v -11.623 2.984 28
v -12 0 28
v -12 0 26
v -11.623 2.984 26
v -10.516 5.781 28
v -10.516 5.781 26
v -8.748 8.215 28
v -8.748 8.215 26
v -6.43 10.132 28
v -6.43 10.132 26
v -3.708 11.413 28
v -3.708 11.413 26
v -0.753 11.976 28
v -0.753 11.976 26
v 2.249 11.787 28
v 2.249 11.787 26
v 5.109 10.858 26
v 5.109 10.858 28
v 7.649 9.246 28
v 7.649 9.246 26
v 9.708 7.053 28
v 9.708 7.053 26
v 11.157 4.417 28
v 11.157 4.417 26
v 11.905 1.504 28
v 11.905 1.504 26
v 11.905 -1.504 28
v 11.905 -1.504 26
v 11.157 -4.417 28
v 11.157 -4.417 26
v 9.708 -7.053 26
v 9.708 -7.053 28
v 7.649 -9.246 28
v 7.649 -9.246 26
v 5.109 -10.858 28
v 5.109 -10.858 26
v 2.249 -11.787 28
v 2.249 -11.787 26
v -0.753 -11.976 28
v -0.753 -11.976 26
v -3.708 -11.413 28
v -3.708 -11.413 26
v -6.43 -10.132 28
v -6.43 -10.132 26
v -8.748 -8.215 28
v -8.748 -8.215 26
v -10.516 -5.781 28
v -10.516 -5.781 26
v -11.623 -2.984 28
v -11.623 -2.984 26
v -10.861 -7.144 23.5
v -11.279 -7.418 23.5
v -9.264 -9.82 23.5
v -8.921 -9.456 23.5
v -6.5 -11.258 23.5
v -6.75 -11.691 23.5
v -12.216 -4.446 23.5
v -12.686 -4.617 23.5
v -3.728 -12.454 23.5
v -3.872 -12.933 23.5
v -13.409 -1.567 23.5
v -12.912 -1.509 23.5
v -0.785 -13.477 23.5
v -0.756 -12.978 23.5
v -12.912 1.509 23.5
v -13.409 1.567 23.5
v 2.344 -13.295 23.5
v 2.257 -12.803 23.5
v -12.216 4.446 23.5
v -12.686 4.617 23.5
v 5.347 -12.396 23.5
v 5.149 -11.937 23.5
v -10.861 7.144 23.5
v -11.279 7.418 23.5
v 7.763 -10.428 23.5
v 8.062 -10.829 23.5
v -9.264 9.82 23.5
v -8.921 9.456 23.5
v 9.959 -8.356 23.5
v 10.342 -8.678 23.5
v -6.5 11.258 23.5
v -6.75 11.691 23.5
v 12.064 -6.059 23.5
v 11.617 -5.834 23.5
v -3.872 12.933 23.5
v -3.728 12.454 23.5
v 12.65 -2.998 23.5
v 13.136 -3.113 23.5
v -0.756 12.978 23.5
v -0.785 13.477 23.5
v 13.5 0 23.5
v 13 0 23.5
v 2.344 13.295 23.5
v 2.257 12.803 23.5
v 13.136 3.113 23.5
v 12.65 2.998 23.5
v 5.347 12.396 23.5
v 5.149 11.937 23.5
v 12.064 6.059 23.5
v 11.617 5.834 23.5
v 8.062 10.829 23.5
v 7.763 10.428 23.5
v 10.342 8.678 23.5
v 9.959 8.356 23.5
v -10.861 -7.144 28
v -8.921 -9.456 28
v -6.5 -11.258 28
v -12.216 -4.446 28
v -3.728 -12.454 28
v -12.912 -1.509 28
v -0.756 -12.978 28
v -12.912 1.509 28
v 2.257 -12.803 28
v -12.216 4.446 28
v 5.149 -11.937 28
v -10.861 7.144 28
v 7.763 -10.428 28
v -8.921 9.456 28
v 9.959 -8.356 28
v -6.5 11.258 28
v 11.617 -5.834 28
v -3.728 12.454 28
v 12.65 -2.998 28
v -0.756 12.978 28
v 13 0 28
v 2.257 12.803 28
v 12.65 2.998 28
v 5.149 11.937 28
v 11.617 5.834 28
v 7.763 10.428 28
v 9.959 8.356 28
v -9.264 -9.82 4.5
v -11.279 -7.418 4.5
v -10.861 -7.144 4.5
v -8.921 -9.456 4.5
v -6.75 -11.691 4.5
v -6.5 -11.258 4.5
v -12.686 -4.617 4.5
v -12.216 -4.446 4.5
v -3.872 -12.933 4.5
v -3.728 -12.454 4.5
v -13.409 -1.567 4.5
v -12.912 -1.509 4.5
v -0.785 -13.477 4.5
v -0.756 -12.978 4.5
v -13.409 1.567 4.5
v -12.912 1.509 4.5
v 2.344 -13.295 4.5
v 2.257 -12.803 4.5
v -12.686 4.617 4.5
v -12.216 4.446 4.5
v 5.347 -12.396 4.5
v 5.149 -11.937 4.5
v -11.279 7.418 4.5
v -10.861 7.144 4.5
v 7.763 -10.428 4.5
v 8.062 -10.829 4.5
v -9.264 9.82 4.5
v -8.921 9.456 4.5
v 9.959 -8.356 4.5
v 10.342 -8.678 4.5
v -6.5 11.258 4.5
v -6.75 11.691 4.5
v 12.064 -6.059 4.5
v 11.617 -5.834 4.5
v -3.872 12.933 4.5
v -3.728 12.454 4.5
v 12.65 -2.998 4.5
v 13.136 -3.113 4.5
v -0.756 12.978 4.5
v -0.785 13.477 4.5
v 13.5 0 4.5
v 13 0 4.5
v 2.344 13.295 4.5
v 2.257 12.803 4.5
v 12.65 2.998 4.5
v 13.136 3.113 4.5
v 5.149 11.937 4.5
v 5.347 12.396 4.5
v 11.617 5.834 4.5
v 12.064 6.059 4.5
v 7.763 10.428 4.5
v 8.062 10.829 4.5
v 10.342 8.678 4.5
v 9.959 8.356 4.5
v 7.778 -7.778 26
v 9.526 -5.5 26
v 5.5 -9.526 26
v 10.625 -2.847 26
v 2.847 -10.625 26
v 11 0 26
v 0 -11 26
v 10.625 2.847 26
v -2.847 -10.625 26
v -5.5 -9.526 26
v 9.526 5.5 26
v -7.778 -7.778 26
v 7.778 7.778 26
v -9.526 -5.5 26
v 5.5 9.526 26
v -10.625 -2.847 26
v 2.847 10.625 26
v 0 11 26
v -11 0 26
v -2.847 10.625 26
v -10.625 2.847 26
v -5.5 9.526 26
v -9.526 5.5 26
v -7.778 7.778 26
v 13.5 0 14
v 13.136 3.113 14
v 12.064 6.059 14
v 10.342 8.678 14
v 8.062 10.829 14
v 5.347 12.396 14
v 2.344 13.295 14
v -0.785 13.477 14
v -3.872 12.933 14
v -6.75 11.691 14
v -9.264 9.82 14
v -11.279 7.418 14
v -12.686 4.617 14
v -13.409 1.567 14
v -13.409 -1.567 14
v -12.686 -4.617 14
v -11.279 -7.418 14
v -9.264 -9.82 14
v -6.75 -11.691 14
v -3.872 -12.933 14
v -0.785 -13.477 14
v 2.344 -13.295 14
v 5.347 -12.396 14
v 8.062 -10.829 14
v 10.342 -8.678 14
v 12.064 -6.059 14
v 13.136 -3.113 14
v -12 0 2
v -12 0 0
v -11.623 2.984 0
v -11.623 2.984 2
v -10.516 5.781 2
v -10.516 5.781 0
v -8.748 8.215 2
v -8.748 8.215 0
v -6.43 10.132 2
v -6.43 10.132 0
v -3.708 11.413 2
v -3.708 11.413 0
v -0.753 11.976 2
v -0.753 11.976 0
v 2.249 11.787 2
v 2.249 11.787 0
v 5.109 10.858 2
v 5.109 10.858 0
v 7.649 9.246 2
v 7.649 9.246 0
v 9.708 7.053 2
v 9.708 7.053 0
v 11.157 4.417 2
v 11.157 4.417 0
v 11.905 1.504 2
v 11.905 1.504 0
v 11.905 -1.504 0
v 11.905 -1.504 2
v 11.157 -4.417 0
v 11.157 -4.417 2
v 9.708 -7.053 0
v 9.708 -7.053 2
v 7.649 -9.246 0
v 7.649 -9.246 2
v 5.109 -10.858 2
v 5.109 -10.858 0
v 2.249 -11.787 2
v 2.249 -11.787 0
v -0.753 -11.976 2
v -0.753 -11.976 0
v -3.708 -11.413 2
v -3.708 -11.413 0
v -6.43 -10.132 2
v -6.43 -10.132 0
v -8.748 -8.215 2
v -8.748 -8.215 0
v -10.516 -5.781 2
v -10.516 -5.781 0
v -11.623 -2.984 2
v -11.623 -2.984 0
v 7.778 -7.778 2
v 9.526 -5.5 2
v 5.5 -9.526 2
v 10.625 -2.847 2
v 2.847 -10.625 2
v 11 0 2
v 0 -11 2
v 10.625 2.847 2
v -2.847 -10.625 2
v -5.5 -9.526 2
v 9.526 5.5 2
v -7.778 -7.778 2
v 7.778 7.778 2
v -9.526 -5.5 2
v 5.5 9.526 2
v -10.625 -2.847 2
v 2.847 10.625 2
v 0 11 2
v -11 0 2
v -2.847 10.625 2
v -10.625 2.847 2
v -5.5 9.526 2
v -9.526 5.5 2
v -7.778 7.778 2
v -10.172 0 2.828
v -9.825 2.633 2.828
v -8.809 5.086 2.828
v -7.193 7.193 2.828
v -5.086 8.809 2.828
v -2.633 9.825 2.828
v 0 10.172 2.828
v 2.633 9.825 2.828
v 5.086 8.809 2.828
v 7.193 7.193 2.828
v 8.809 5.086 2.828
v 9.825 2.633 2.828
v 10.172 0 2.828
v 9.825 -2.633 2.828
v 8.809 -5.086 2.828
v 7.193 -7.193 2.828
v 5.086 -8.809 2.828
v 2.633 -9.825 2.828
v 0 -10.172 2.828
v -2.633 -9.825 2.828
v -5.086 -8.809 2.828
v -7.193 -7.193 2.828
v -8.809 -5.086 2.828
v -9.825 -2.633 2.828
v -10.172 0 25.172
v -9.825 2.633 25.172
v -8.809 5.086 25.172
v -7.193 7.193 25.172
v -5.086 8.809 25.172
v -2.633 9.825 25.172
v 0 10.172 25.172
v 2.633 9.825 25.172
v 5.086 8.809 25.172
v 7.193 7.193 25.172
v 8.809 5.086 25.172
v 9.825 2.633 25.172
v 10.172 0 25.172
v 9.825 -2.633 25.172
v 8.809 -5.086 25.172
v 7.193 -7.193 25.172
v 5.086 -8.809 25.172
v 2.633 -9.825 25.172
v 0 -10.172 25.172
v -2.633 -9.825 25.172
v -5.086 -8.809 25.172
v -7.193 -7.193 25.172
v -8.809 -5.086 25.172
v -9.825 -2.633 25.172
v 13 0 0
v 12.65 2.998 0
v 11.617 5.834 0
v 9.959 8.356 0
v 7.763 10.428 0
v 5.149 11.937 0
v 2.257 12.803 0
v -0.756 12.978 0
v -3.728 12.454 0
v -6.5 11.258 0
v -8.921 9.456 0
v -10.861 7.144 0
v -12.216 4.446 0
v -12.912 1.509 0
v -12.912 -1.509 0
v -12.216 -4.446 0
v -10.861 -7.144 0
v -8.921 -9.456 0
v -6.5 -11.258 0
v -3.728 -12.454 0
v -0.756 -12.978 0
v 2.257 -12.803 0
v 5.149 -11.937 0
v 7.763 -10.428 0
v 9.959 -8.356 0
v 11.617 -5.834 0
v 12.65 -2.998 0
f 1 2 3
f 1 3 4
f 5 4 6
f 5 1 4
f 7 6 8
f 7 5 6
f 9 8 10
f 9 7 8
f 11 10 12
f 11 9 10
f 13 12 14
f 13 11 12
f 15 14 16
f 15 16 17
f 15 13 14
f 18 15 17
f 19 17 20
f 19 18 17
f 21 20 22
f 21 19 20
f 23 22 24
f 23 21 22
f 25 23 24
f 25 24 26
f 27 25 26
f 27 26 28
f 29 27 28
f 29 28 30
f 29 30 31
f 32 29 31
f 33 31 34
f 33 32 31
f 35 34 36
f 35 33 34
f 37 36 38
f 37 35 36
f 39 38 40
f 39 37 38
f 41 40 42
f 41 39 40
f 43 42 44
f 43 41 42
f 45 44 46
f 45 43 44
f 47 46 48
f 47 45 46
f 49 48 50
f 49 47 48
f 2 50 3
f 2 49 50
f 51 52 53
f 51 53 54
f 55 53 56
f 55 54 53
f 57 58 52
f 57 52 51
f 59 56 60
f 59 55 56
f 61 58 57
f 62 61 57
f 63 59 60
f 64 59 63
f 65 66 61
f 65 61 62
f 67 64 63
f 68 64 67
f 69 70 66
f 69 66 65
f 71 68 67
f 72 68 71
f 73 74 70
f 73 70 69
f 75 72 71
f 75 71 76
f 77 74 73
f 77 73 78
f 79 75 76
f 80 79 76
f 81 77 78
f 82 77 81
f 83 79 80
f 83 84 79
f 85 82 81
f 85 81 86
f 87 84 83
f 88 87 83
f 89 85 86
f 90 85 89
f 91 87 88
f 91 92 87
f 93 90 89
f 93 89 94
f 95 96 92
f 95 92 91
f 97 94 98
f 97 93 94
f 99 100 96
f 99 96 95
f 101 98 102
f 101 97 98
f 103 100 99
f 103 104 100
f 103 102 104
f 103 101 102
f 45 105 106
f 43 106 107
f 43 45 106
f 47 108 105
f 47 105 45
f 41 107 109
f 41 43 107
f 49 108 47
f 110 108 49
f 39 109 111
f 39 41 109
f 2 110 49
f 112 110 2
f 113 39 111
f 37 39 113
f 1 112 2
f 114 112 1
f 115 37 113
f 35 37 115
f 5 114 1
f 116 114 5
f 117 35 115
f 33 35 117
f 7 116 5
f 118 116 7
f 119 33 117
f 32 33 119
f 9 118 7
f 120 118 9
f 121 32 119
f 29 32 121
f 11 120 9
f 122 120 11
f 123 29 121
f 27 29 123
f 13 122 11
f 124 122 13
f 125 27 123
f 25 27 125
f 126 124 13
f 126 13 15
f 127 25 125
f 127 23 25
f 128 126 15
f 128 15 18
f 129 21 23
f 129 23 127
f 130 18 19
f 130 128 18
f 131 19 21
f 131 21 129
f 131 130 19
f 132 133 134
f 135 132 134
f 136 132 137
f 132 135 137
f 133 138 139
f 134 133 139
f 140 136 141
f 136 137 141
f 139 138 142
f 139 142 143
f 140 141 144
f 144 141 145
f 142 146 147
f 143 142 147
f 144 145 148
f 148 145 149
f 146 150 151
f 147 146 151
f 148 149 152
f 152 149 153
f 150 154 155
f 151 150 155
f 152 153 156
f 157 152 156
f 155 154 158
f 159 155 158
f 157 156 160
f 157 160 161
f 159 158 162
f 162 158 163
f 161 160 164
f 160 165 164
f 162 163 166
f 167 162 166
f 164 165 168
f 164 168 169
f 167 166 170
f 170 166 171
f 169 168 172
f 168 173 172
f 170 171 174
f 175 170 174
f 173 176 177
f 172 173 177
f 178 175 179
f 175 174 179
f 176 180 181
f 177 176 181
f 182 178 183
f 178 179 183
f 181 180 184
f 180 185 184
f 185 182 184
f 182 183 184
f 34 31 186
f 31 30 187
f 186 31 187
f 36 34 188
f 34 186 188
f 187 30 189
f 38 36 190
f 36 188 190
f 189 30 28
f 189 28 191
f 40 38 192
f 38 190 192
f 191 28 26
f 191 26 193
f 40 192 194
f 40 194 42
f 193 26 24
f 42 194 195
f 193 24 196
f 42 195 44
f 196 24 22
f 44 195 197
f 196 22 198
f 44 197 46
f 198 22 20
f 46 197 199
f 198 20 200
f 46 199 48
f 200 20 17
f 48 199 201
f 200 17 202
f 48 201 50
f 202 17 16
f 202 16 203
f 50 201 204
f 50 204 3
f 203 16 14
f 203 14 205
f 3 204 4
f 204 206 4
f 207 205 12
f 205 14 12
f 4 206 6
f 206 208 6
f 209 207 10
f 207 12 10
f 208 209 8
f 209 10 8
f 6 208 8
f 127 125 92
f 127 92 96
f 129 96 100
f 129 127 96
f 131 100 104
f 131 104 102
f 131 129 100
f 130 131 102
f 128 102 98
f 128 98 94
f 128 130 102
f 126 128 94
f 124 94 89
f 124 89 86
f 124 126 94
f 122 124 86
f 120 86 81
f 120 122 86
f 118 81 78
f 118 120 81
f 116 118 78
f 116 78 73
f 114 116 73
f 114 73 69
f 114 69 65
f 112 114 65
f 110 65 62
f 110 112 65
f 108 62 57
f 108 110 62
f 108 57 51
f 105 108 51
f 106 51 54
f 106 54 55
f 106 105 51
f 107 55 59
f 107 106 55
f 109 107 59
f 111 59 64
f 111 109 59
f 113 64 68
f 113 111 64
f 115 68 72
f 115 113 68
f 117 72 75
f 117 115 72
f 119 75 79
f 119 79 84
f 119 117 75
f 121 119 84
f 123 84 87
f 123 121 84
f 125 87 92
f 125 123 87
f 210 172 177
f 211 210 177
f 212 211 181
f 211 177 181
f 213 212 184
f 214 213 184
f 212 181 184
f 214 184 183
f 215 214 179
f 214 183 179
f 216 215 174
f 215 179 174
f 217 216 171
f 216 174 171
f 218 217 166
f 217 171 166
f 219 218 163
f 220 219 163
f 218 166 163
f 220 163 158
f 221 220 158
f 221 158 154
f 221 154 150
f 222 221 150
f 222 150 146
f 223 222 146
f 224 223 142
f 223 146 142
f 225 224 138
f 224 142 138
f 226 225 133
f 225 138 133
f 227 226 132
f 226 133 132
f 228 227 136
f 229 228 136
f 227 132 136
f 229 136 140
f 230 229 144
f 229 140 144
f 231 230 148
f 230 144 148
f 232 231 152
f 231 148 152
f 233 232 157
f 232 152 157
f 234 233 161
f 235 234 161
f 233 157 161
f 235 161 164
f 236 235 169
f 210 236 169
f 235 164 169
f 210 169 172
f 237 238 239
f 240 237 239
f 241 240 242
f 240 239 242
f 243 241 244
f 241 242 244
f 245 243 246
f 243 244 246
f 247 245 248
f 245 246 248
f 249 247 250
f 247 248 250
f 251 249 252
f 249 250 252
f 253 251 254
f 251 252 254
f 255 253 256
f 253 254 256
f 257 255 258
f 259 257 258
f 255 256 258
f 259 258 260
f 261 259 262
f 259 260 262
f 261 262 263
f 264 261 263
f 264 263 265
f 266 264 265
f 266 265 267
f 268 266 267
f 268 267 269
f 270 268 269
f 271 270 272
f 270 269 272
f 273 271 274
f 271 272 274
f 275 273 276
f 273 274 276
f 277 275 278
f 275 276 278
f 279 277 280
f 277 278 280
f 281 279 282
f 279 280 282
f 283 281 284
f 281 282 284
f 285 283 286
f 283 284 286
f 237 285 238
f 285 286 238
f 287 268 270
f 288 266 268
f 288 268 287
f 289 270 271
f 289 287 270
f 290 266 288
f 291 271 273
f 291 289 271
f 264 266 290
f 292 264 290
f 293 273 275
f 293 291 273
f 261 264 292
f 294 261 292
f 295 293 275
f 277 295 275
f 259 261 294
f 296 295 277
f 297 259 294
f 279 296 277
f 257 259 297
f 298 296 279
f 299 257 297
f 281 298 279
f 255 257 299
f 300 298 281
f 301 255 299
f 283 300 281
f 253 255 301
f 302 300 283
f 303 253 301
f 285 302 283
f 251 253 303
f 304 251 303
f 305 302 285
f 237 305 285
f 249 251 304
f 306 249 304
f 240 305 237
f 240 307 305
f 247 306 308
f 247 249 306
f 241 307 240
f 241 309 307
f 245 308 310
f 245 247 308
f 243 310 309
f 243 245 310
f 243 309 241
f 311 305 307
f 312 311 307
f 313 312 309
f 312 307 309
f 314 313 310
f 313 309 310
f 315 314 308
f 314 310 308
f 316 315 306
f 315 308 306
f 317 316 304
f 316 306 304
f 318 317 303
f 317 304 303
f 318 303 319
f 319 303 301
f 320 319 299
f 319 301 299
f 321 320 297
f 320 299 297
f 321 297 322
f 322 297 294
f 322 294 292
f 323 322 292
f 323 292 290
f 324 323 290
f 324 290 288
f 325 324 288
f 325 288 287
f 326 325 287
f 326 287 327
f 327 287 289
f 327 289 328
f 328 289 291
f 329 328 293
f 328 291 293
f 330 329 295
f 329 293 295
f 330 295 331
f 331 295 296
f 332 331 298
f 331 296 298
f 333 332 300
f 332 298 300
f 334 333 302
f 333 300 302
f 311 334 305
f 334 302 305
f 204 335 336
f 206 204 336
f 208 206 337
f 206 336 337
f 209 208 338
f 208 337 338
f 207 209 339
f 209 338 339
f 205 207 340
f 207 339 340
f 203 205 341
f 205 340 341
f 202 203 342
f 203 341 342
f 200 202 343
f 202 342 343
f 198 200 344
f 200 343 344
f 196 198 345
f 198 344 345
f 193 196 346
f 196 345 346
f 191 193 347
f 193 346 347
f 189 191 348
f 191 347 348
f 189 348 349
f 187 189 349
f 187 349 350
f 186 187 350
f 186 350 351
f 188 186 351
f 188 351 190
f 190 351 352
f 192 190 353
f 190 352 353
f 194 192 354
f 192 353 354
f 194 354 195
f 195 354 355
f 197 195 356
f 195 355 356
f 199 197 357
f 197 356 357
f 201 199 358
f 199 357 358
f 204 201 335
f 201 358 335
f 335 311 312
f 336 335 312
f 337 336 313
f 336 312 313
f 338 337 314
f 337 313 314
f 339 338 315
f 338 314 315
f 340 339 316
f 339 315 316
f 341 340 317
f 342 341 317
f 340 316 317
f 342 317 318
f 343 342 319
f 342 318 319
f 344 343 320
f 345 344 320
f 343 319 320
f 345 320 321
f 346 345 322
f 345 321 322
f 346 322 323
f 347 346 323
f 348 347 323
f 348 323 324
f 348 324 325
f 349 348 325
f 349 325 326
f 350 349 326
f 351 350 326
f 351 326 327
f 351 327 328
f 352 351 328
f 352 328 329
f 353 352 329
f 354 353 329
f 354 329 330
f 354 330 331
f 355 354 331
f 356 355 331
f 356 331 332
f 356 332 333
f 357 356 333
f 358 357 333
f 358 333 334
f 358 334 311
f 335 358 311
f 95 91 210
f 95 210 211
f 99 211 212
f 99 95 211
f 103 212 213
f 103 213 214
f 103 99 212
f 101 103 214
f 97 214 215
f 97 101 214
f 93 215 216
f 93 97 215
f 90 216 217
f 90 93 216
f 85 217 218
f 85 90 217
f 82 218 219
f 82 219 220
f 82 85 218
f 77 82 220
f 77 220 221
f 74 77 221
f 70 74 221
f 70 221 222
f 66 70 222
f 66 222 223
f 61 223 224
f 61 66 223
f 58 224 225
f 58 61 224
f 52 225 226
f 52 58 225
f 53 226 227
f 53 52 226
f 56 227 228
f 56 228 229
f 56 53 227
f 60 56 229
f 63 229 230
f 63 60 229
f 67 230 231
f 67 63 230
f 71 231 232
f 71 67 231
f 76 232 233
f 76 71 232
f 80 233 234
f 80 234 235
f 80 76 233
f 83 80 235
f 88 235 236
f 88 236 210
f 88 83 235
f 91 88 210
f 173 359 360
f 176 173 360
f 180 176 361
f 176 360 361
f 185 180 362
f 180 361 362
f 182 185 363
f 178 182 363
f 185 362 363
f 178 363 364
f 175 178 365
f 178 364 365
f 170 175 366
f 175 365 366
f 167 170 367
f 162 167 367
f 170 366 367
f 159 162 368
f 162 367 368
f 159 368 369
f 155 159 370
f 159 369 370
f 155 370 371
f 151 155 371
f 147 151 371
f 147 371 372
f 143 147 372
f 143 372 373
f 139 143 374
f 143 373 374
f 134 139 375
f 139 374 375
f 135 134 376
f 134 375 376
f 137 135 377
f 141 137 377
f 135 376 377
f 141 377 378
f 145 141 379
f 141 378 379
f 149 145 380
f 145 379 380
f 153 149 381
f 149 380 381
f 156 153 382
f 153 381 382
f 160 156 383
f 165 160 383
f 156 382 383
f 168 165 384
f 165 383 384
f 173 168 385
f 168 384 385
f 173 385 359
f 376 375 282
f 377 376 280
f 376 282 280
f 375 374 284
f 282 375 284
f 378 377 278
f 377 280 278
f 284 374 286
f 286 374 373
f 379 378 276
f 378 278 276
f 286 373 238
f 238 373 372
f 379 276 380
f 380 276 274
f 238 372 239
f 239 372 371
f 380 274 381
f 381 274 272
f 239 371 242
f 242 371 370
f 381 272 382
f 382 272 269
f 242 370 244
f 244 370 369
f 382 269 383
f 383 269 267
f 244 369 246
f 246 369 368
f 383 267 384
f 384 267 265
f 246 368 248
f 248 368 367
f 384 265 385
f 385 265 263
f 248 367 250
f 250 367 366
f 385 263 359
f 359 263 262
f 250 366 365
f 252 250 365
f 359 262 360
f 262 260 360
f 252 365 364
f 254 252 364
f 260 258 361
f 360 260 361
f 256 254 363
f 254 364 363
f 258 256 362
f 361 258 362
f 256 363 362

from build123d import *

# Parameters (mm, degrees)
SKETCH_2_R          = 13
EXTRUDE_1_DEPTH     = 4.5
SKETCH_3_R          = 13.5
EXTRUDE_2_DEPTH     = 9.5
SKETCH_4_R          = 12
CUT_EXTRUDE_1_DEPTH = 2
SKETCH_5_R          = 10.172
CUT_EXTRUDE_2_DEPTH = 27
CHAMFER_1_SIZE      = 0.828


with BuildPart() as part:
    # Эскиз2 → Бобышка-Вытянуть1 (new body)
    with BuildSketch(Plane.XY):
        Circle(SKETCH_2_R)
    extrude(amount=EXTRUDE_1_DEPTH)

    # Эскиз3 → Бобышка-Вытянуть2 (add)
    with BuildSketch(Plane.XY.offset(4.5)):
        Circle(SKETCH_3_R)
    extrude(amount=EXTRUDE_2_DEPTH)

    # Эскиз4 → Вырез-Вытянуть1 (cut)
    with BuildSketch(Plane(origin=(0, 0, 0), x_dir=(-1, 0, 0), z_dir=(0, 0, -1))):
        Circle(SKETCH_4_R)
    extrude(amount=-CUT_EXTRUDE_1_DEPTH, mode=Mode.SUBTRACT)

    # Зеркальное отражение4: part across plane


with BuildPart() as part_1:
    add(part.part)
    add(part.part.mirror(Plane.XY.offset(14)))

    # Эскиз5 → Вырез-Вытянуть2 (cut, through all)
    with BuildSketch(Plane(origin=(0, 0, 2), x_dir=(-1, 0, 0), z_dir=(0, 0, -1))):
        Circle(SKETCH_5_R)
    extrude(amount=-CUT_EXTRUDE_2_DEPTH, mode=Mode.SUBTRACT)

    # Фаска1
    chamfer_1_edges = [part_1.edges().sort_by_distance(p)[0] for p in [
        (10.172, 0, 26),
        (10.172, 0, 2),
    ]]
    chamfer(chamfer_1_edges, length=CHAMFER_1_SIZE)


solid = part_1.part
